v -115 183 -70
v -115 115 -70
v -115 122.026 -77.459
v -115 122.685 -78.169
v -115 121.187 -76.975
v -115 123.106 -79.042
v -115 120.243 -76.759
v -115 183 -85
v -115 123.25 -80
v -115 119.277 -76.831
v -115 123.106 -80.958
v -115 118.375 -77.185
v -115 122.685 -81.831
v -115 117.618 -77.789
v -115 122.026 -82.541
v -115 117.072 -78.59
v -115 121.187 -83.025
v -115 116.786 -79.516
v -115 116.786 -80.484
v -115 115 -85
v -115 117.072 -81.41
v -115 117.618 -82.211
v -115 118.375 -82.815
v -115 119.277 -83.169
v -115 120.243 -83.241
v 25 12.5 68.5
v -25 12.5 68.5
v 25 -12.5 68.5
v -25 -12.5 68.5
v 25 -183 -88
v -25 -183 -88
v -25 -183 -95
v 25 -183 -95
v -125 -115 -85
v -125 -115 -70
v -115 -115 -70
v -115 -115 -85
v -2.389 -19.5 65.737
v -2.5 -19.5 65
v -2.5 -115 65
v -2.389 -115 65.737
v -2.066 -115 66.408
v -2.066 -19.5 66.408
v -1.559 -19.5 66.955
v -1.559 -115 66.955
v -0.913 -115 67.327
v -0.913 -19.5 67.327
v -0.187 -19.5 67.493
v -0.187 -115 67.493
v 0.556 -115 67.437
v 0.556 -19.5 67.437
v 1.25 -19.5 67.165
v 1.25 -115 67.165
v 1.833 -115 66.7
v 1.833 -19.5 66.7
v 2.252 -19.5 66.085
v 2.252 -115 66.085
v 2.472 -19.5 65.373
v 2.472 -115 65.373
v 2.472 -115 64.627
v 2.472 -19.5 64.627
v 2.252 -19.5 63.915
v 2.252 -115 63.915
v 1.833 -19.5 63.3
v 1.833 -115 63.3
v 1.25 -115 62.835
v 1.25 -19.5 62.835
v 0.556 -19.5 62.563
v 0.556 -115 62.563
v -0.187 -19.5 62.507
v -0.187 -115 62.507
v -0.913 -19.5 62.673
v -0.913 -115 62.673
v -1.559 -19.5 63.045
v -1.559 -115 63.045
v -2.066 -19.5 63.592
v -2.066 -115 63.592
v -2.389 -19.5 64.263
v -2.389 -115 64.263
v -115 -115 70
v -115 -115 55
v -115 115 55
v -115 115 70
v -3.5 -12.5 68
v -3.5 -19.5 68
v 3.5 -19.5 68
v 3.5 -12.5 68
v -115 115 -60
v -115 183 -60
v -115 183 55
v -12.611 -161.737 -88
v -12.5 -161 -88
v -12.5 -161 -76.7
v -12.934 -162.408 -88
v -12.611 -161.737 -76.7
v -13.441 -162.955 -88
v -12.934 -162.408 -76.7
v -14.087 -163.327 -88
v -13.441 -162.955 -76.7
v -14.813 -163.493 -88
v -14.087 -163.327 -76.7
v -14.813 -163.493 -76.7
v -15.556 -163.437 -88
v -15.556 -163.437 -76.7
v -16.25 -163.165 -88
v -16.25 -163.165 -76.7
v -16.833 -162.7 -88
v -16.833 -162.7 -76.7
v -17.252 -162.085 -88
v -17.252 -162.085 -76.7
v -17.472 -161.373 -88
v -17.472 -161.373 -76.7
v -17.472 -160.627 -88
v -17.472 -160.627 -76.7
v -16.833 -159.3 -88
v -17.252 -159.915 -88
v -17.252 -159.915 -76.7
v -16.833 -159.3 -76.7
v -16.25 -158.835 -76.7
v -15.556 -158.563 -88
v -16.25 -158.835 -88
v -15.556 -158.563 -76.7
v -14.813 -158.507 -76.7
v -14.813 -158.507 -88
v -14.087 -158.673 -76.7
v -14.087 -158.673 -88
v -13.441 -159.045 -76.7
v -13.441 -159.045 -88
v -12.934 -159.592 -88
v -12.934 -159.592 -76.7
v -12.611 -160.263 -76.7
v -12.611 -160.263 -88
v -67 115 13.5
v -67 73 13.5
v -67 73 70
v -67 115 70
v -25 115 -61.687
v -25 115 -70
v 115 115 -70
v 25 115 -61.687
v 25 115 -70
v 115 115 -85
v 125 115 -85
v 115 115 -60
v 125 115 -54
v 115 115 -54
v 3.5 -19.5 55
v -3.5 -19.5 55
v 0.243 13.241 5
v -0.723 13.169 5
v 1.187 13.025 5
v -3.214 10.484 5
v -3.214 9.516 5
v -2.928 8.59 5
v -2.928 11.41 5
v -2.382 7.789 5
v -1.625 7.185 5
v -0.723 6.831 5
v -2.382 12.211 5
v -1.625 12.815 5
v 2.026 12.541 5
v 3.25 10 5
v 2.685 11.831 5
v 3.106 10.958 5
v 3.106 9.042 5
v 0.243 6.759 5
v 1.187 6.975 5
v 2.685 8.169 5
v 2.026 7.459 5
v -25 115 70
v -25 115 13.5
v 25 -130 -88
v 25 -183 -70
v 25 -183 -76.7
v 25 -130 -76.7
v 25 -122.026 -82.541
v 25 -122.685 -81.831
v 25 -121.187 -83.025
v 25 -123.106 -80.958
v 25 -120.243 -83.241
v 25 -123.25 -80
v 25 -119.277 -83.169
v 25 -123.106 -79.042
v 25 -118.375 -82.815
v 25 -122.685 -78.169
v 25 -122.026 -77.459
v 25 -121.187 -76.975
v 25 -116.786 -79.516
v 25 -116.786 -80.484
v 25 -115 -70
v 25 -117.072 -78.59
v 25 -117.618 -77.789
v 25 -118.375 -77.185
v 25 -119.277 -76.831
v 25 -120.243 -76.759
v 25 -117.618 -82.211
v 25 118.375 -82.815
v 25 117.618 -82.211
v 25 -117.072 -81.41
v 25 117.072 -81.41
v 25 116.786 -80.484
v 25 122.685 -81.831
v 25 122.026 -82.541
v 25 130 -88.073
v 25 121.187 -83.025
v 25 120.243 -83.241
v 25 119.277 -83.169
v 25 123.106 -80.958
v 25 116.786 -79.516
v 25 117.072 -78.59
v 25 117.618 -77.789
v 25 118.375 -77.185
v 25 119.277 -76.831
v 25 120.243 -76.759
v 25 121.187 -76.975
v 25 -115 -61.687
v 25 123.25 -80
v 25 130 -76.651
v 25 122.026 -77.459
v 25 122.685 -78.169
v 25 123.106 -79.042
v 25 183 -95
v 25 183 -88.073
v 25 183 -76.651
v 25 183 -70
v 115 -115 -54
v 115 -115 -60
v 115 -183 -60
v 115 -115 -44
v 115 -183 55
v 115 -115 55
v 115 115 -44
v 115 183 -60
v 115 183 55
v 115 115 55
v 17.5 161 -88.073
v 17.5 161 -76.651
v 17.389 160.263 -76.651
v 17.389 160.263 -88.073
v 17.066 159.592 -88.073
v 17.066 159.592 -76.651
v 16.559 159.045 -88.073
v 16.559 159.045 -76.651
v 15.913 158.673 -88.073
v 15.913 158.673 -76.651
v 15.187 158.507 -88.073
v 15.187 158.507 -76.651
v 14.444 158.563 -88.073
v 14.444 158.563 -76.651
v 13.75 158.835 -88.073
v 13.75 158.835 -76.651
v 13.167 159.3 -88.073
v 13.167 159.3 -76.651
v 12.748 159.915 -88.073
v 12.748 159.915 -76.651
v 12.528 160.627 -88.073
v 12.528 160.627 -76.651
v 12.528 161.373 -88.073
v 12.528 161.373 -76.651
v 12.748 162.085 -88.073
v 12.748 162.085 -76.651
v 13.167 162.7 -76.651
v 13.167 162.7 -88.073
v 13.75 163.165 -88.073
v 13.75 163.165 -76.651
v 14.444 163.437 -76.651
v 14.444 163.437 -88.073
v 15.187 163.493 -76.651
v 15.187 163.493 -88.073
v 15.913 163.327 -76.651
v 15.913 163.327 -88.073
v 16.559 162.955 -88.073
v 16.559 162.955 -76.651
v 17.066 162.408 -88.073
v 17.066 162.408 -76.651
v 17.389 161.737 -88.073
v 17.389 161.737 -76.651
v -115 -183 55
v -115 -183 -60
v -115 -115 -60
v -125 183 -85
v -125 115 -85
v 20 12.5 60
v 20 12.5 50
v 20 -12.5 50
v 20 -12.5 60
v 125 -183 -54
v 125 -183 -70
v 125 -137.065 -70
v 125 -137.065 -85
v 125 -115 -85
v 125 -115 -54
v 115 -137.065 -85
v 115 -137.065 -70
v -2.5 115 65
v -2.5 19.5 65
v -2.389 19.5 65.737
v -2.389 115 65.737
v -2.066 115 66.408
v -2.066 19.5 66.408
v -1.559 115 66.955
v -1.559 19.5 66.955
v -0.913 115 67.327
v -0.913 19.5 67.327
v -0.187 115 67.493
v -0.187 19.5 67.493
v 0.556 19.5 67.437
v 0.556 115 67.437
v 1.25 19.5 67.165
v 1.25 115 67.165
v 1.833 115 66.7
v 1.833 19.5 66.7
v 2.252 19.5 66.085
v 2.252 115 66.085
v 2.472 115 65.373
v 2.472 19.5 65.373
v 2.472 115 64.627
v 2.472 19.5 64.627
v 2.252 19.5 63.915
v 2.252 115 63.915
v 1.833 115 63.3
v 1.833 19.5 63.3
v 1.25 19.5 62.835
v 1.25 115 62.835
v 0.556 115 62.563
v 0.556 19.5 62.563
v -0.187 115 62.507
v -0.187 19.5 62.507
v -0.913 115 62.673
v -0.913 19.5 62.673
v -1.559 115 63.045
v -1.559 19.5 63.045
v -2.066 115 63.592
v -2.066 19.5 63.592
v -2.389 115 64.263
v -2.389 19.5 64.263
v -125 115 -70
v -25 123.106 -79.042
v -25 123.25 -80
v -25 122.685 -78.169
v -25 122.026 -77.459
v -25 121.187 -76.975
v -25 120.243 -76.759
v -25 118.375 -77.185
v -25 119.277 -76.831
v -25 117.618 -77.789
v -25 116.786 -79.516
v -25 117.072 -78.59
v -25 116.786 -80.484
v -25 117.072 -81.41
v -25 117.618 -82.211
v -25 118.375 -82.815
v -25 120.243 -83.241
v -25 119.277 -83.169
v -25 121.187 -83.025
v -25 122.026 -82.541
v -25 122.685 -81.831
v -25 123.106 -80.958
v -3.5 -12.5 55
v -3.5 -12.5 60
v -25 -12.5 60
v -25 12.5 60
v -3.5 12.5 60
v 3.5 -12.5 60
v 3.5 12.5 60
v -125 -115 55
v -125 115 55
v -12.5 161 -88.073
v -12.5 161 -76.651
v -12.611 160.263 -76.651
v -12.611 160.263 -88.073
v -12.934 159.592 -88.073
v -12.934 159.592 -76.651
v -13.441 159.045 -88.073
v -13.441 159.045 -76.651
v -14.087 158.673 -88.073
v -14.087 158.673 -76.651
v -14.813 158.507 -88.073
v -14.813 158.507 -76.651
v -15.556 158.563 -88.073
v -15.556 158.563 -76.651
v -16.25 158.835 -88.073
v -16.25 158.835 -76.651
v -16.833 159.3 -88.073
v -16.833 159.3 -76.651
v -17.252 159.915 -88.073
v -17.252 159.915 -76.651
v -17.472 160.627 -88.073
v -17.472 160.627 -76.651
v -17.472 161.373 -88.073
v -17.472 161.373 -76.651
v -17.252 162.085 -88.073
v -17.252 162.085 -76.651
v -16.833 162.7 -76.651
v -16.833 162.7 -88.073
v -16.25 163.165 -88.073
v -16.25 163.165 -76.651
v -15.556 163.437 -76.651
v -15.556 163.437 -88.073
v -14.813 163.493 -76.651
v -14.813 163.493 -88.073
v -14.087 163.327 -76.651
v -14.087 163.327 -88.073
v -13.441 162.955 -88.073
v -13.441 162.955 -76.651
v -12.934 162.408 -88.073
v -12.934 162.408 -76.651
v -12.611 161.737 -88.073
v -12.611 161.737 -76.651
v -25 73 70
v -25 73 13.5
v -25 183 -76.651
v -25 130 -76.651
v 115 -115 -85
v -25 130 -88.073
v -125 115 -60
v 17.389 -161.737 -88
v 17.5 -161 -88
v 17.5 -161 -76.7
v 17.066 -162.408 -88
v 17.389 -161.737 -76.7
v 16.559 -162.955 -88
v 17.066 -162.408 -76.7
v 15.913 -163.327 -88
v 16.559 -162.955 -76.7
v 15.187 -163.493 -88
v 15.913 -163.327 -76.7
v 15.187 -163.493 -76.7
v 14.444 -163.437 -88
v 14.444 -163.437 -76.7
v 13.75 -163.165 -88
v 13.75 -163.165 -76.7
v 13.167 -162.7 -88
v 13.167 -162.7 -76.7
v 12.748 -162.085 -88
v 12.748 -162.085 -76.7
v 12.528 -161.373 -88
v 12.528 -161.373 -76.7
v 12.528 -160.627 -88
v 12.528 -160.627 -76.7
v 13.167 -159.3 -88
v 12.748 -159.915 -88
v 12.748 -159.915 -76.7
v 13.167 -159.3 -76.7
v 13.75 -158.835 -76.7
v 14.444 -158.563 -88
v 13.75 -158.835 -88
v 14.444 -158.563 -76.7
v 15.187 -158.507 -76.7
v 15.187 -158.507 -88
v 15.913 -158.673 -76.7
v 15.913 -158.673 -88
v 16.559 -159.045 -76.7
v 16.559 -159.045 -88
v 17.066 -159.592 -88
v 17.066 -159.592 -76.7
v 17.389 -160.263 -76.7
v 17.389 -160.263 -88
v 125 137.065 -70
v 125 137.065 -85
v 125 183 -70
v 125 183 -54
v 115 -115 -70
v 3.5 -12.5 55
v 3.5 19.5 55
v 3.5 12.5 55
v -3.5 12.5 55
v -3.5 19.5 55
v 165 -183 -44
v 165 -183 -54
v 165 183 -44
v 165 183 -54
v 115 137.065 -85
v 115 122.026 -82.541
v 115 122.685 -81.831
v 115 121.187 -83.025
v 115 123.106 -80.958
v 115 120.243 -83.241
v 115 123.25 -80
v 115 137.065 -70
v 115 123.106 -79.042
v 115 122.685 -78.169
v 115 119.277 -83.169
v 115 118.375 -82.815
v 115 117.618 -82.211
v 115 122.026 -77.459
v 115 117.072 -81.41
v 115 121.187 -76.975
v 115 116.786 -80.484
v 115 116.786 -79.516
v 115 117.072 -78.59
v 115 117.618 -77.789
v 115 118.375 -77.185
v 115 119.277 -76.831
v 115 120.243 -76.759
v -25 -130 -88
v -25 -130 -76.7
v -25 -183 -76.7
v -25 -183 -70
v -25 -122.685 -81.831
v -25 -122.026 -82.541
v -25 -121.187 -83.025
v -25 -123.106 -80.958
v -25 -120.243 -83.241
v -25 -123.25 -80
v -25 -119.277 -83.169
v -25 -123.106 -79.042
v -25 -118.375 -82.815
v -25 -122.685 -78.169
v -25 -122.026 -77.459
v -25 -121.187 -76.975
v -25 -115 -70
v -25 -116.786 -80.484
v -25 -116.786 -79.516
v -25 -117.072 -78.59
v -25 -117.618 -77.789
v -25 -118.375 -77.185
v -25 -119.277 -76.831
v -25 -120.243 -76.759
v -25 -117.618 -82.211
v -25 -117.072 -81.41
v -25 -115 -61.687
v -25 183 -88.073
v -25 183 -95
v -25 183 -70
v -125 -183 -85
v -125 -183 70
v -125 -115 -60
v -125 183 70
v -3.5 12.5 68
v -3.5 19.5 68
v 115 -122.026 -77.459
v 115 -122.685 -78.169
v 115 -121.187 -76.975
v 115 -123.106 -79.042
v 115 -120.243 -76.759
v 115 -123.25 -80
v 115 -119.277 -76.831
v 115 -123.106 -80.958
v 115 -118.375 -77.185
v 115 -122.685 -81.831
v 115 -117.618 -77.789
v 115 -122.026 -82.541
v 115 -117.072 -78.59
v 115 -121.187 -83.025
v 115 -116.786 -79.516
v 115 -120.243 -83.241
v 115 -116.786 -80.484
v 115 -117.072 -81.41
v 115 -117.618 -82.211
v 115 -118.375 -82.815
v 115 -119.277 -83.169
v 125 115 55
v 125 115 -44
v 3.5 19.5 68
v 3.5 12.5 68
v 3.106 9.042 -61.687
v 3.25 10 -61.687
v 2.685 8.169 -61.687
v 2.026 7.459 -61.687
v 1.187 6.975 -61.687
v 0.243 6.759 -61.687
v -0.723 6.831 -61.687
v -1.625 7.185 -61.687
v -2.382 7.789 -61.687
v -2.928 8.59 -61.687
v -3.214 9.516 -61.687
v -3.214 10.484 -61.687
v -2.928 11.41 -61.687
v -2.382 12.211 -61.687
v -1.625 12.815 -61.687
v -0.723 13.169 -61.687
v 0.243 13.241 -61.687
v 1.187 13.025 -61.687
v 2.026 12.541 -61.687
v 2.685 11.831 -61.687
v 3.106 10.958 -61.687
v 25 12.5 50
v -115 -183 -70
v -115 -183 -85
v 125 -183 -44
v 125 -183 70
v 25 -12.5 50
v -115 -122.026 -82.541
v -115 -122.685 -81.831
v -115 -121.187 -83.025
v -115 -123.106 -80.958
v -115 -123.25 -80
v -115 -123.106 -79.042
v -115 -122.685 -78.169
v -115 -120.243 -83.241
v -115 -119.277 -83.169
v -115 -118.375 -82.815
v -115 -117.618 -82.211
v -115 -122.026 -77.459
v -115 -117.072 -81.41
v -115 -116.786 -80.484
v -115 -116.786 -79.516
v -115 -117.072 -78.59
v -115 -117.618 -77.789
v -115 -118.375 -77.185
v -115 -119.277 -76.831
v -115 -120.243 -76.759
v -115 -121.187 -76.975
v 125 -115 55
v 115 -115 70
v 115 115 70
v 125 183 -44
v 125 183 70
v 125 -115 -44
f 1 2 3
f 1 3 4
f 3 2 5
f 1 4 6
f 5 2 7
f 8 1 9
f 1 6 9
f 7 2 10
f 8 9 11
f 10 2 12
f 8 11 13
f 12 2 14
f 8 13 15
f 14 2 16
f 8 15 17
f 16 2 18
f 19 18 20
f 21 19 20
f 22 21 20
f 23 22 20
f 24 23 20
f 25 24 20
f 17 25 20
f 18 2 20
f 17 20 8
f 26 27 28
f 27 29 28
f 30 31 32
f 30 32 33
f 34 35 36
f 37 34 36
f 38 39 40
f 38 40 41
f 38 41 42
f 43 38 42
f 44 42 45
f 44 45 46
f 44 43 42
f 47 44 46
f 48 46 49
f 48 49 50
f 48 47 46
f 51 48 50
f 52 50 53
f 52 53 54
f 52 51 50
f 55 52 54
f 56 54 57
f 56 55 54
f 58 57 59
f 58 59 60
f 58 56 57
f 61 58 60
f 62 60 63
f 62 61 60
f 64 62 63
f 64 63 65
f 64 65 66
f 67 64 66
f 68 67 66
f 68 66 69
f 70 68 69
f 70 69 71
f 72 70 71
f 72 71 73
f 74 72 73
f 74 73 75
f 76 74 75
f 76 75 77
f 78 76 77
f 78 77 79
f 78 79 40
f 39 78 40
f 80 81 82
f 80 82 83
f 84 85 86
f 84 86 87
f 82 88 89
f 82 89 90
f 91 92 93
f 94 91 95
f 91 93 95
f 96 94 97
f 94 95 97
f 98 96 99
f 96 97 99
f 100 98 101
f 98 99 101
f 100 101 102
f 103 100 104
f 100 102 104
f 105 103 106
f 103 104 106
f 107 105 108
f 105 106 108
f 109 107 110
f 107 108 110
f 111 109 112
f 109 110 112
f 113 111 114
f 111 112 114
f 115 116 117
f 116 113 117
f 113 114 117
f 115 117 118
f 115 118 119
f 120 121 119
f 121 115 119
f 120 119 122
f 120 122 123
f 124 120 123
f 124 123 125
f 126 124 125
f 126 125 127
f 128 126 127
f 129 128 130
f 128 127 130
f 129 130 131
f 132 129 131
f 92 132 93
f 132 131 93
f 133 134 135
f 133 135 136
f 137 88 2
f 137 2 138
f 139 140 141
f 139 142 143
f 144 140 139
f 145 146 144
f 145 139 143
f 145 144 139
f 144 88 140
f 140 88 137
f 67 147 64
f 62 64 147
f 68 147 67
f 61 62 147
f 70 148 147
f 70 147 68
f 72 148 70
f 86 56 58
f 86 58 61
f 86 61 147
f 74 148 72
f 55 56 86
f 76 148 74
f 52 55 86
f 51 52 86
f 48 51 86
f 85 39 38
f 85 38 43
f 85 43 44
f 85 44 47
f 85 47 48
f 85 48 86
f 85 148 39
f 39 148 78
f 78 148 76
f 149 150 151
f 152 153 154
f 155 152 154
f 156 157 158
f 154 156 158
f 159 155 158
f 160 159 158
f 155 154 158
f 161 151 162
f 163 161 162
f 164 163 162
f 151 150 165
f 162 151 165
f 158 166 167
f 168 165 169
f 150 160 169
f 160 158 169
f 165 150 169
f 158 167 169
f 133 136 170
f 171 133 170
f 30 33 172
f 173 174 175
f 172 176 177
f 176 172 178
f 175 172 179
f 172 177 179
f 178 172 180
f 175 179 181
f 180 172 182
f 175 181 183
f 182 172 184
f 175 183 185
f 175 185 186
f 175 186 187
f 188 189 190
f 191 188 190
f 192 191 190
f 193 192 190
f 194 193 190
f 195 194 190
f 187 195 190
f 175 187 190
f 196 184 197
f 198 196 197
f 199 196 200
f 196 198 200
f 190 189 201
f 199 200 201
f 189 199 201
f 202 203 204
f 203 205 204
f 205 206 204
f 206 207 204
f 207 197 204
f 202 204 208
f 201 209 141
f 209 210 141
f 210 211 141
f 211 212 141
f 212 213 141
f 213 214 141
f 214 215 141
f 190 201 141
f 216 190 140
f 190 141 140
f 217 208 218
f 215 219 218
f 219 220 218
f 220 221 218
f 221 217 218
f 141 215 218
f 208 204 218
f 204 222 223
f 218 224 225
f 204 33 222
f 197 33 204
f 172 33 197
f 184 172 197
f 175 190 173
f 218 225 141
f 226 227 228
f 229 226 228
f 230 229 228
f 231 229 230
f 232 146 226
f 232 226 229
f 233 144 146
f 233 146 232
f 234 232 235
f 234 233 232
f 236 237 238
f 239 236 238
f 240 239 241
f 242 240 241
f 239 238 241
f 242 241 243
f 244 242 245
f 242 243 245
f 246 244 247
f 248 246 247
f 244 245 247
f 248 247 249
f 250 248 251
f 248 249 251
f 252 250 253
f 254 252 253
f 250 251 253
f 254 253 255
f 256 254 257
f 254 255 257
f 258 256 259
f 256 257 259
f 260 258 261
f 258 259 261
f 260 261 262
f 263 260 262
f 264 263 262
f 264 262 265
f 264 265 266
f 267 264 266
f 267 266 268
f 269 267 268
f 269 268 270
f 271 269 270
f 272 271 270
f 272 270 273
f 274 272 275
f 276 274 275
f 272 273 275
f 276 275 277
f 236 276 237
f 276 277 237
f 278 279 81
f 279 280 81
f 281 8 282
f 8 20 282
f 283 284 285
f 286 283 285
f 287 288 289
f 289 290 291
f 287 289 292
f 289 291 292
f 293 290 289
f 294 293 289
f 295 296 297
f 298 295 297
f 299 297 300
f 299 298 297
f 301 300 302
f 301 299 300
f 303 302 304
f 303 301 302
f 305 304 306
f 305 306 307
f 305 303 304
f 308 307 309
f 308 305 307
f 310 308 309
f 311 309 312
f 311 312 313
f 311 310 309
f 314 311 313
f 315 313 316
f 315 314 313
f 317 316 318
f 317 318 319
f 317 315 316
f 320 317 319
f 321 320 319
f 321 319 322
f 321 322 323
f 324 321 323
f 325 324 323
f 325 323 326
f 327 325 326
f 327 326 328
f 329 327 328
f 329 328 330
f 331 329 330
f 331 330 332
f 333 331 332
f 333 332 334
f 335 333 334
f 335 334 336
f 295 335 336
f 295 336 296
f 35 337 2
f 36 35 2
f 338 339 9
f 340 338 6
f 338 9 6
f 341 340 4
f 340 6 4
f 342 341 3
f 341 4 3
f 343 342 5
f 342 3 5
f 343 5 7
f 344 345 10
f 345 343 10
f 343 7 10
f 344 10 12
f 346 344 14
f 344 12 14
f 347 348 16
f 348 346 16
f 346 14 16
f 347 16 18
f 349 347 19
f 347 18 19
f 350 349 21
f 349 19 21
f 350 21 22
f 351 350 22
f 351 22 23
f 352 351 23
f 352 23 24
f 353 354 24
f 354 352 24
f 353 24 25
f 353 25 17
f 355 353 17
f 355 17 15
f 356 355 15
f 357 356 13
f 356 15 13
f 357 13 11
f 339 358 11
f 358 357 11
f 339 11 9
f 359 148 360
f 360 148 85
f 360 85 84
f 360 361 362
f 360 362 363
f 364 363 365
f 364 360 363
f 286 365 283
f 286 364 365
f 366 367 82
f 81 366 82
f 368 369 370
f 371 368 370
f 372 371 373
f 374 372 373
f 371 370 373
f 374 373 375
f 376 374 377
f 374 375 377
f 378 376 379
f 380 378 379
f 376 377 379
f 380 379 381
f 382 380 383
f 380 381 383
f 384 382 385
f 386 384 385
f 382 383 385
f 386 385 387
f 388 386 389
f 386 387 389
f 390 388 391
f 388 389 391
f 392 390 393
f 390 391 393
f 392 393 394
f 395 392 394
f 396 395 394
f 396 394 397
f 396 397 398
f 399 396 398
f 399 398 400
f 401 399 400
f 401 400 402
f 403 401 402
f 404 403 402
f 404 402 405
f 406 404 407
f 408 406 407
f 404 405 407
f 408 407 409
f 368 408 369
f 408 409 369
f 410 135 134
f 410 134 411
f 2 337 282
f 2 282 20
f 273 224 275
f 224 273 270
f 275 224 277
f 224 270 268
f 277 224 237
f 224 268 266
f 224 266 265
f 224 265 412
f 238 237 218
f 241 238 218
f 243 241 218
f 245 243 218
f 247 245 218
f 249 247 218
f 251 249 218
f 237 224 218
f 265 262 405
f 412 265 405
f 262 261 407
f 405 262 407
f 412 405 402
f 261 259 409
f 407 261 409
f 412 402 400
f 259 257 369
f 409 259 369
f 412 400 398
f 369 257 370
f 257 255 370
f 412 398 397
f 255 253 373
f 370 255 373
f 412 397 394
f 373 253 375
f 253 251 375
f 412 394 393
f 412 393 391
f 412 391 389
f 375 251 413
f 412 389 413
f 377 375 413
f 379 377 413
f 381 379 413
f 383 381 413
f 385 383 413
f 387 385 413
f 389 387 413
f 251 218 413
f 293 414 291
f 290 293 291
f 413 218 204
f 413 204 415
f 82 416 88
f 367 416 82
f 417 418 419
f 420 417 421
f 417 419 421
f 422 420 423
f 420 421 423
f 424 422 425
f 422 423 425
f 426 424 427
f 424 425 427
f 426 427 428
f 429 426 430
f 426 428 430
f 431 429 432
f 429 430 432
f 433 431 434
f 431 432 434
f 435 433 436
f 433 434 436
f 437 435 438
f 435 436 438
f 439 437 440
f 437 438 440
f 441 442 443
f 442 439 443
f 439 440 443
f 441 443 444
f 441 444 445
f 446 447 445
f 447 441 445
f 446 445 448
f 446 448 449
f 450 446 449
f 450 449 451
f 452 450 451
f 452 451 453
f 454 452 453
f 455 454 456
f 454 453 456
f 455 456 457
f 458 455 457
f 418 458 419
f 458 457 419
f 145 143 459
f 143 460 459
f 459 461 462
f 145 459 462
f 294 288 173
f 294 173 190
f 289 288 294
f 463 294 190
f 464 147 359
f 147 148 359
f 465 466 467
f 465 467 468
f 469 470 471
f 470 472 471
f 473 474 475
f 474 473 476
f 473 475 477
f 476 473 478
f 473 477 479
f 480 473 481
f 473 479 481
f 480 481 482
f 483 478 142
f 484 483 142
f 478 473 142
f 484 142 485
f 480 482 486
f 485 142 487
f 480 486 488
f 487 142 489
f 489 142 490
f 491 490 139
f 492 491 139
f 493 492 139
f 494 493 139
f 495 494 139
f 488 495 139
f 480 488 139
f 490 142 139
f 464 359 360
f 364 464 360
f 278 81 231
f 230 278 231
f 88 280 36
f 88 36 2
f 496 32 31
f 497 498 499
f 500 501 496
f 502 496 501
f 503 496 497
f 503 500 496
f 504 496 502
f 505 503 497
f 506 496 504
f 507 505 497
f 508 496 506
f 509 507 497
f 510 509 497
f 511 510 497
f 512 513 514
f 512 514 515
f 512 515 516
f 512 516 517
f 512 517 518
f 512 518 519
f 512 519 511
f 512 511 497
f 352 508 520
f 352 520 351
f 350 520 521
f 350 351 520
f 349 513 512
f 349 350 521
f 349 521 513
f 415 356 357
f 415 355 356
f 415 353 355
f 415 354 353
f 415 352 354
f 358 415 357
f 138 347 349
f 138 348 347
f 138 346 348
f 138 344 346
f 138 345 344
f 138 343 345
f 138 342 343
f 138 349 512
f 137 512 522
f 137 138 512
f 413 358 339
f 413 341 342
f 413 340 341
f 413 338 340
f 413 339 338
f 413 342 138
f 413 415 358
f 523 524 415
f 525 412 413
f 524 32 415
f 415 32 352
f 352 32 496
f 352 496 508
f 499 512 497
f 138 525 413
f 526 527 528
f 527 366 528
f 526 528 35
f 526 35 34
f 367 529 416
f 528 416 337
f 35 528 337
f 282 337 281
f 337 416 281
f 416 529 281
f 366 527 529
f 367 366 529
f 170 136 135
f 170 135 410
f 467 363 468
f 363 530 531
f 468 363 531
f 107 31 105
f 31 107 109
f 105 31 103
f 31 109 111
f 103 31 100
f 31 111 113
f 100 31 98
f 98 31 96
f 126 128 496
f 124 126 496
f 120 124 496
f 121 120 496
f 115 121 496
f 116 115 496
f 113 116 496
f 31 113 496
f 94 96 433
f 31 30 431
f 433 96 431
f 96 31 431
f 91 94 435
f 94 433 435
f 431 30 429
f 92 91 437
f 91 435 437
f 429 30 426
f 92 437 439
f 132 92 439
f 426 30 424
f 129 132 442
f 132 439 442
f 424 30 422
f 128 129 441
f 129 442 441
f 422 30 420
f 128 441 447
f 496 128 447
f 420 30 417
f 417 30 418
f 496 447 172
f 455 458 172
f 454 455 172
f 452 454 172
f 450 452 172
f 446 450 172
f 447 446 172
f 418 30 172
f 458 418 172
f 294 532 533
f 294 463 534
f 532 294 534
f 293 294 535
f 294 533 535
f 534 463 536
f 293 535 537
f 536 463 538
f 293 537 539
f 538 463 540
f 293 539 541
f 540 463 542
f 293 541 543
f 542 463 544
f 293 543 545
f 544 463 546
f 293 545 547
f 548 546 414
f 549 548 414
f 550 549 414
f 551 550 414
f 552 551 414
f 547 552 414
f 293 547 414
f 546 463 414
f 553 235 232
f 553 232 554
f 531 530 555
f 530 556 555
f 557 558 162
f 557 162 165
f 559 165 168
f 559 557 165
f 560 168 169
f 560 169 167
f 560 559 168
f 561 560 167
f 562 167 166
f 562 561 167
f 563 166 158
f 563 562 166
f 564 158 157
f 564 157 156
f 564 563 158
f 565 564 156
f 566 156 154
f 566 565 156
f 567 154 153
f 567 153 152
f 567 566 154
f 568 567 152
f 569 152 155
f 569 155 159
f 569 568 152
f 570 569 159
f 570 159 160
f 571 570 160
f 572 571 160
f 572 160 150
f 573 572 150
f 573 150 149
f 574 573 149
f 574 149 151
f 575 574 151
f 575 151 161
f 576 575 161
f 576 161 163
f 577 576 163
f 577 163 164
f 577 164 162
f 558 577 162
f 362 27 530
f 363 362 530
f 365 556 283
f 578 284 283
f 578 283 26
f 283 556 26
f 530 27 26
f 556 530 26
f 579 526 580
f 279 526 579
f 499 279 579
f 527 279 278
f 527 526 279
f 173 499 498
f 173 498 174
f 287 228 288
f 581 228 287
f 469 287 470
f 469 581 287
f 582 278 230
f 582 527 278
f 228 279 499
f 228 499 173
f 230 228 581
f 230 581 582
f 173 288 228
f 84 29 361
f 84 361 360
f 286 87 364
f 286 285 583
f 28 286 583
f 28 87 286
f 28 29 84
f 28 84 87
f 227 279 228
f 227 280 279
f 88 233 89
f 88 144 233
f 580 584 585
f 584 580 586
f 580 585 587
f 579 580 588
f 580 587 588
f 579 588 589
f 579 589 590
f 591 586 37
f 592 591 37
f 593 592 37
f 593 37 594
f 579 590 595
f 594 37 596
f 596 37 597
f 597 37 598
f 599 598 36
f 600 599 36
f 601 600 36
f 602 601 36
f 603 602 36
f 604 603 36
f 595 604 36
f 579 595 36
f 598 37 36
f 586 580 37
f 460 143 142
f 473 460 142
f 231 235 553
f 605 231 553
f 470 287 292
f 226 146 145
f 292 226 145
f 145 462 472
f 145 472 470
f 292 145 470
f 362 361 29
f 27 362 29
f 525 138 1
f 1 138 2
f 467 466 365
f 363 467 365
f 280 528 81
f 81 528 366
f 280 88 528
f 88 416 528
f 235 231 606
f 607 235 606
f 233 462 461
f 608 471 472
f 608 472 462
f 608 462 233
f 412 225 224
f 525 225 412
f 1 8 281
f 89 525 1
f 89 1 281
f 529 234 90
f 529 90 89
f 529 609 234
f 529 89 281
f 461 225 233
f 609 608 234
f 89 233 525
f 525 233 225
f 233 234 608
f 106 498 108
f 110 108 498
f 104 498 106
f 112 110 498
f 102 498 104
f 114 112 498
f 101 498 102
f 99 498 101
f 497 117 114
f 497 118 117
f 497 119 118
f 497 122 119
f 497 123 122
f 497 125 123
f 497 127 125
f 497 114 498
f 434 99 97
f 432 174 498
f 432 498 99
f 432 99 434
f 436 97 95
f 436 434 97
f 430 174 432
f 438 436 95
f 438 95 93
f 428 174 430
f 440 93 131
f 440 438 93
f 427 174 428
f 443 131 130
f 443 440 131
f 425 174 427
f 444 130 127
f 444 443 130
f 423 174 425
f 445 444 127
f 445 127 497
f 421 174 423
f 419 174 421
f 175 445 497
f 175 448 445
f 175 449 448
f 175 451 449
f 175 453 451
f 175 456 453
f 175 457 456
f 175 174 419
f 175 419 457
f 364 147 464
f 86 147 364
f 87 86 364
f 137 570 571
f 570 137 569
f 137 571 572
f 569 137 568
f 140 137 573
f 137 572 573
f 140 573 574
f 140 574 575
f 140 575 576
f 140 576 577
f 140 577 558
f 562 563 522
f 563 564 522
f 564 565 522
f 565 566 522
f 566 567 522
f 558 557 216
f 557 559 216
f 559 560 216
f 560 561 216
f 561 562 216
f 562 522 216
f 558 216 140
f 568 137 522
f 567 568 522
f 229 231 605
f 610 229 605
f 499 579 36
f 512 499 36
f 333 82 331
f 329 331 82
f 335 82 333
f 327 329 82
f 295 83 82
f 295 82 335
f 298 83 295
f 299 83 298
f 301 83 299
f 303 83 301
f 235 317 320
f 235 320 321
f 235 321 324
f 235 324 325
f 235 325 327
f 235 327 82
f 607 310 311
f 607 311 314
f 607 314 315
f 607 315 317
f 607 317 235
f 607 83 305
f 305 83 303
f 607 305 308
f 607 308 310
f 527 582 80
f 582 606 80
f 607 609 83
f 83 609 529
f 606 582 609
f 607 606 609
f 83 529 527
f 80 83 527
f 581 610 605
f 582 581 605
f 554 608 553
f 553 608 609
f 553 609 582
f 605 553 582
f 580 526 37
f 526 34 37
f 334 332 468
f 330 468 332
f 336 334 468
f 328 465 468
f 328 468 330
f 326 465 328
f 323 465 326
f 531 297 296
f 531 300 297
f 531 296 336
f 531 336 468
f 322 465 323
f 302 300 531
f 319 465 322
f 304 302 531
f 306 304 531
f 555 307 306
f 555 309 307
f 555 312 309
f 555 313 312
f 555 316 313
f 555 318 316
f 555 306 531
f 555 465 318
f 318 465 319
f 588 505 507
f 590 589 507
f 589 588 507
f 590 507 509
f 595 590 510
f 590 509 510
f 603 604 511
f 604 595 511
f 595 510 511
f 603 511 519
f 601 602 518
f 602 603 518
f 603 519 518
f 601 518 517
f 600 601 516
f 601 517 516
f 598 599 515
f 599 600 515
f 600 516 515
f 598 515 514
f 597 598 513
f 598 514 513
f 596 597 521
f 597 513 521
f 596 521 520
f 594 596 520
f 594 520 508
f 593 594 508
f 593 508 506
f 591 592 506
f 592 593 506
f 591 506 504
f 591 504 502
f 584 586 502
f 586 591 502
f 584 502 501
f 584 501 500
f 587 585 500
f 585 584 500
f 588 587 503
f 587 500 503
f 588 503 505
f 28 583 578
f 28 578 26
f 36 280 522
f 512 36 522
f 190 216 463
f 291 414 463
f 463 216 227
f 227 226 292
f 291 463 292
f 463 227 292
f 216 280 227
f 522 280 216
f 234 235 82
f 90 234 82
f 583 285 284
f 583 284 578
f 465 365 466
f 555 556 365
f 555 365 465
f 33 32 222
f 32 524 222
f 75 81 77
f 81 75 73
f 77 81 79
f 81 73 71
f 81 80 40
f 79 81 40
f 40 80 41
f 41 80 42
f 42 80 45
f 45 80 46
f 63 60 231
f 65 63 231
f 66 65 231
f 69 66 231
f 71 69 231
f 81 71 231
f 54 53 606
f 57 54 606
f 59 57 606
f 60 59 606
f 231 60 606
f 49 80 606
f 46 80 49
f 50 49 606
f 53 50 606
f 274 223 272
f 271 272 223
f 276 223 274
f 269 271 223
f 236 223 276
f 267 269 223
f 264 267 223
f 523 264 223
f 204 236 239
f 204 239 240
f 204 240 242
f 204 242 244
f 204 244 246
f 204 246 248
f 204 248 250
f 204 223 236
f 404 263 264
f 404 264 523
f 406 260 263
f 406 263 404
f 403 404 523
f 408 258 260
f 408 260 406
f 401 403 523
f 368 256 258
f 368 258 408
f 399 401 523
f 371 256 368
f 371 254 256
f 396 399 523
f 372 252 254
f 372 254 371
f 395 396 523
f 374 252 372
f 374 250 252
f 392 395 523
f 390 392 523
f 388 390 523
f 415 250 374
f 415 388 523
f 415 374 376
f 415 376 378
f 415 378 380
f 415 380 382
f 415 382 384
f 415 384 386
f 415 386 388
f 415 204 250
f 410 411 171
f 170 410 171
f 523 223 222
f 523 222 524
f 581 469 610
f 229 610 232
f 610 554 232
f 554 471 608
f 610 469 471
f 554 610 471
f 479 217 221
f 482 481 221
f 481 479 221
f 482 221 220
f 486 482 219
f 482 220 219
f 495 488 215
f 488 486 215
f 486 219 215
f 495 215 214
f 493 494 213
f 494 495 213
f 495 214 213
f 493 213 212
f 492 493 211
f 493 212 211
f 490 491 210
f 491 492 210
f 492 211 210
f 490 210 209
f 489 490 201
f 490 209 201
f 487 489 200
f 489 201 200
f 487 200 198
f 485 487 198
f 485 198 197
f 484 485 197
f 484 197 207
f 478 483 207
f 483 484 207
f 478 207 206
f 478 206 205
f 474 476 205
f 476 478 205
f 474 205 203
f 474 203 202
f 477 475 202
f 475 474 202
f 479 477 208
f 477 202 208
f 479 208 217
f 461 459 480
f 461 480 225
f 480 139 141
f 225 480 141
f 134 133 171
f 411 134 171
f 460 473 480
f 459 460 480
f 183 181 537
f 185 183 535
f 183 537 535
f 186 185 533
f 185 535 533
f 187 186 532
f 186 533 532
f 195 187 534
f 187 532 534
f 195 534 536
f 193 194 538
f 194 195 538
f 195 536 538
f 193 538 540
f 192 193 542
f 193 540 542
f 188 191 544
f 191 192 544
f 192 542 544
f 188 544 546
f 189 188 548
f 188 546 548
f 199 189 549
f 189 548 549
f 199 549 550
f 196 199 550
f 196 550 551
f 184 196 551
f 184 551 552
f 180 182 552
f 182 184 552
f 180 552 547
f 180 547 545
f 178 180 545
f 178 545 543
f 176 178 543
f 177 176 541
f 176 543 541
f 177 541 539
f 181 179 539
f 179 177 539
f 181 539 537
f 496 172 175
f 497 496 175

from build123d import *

# Parameters (mm, degrees)
F0_W         = 250
F0_H         = 250
F1_DEPTH     = 70
F2_T         = -10
F3_W         = 230
F3_H         = 120
F4_DEPTH     = 300
F5_W         = 230
F5_H         = 120
F6_DEPTH     = 300
F7_W         = 230
F7_H         = 230
F8_DEPTH     = 500
F9_W         = 10
F9_H         = 10
F1_FACE3_W   = 250
F1_FACE3_H   = 250
F1_FACE3_W_2 = 230
F1_FACE3_H_2 = 230
F10_DEPTH    = 15
F11_R        = 2.5
F12_DEPTH    = 250
F13_W        = 50
F13_H        = 18.5
F14_DEPTH    = 12.5
F16_DEPTH    = 10
F17_W        = 7
F17_H        = 13
F18_DEPTH    = 3.5
F19_R        = 3.25
F20_DEPTH    = 240
F21_W        = 50
F21_H        = 33.3125502616
F22_DEPTH    = 115
F23_R        = 3.25
F24_DEPTH    = 240
F25_R        = 3.25
F26_DEPTH    = 100
F27_W        = 42
F27_H        = 42
F28_DEPTH    = 56.5
F29_W        = 230
F29_H        = 115
F30_DEPTH    = 58
F31_W        = 230
F31_H        = 115
F32_DEPTH    = 58
F33_W        = 50
F33_H        = 25
F34_DEPTH    = 15
F35_W        = 50
F35_H        = 6.9269549847
F35_H_2      = 6.6508132219
F36_DEPTH    = 53
F37_R        = 2.5
F38_DEPTH    = 11.4222317934
F39_W        = 10
F39_H        = 230
F40_DEPTH    = 25
F41_W        = 40
F41_H        = 10
F41_W_2      = 10
F42_DEPTH    = 230
F43_W        = 40
F43_H        = 10
F44_DEPTH    = 68
F45_W        = 45.9353046417
F45_H        = 15
F46_DEPTH    = 25
F47_DEPTH    = 68
F48_W        = 45.9353
F48_H        = 15
F49_DEPTH    = 25
F50_DEPTH    = 68
F51_W        = 53
F51_H        = 11.3
F52_DEPTH    = 50
F53_R        = 2.5
F54_DEPTH    = 18.3


with BuildPart() as f1:
    # F0 (on Top) → F1 (new body, symmetric)
    with BuildSketch(Plane.XY):
        Rectangle(F0_W, F0_H)
    extrude(amount=F1_DEPTH, both=True)

    # F2
    f2_openings = [f1.faces().sort_by_distance(p)[0] for p in [
        (0, 0, 70),
    ]]
    offset(amount=F2_T, openings=f2_openings)

    # F3 (on face) → F4 (cut)
    with BuildSketch(Plane.XZ.offset(125)):
        Rectangle(F3_W, F3_H)
    extrude(amount=-F4_DEPTH, mode=Mode.SUBTRACT)

    # F5 (on face) → F6 (cut)
    with BuildSketch(Plane(origin=(-125, 0, 0), x_dir=(0, -1, 0), z_dir=(-1, 0, 0))):
        Rectangle(F5_W, F5_H)
    extrude(amount=-F6_DEPTH, mode=Mode.SUBTRACT)

    # F7 (on face) → F8 (cut)
    with BuildSketch(Plane.XY.offset(-60)):
        Rectangle(F7_W, F7_H)
    extrude(amount=-F8_DEPTH, mode=Mode.SUBTRACT)

    # F9 (on face) + F1_face3 (on face) → F10 (join)
    with BuildSketch(Plane(origin=(0, 0, -70), x_dir=(1, 0, 0), z_dir=(0, 0, -1))):
        with Locations((-120, -120)):
            Rectangle(F9_W, F9_H)
        with Locations((-120, 120)):
            Rectangle(F9_W, F9_H)
        with Locations((120, -120)):
            Rectangle(F9_W, F9_H)
        with Locations((120, 120)):
            Rectangle(F9_W, F9_H)
    with BuildSketch(Plane.XY.offset(70)):
        Rectangle(F1_FACE3_W, F1_FACE3_H)
        Rectangle(F1_FACE3_W_2, F1_FACE3_H_2, mode=Mode.SUBTRACT)
    extrude(amount=F10_DEPTH, dir=(0, 0, -1))

    # F11 (on face) → F12 (join)
    with BuildSketch(Plane(origin=(0, 125, 0), x_dir=(-1, 0, 0), z_dir=(0, 1, 0))):
        with Locations((0, 65)):
            Circle(F11_R)
    extrude(amount=-F12_DEPTH)

    # F13 (on Front) → F14 (join, symmetric)
    with BuildSketch(Plane.XZ):
        with Locations((0, 59.25)):
            Rectangle(F13_W, F13_H)
    extrude(amount=F14_DEPTH, both=True)

    # F15 (on face) → F16 (cut)
    with BuildSketch(Plane(origin=(0, 0, 50), x_dir=(1, 0, 0), z_dir=(0, 0, -1))):
        Polygon((20, -12.5), (20, 7.5), (20, 12.5), (-25, 12.5), (-25, -12.5), align=None)
    extrude(amount=-F16_DEPTH, mode=Mode.SUBTRACT)

    # F17 (on Right) → F18 (join, symmetric)
    with BuildSketch(Plane.YZ):
        with Locations((-16, 61.5)):
            Rectangle(F17_W, F17_H)
        with Locations((16, 61.5)):
            Rectangle(F17_W, F17_H)
    extrude(amount=F18_DEPTH, both=True)

    # F19 (on face) → F20 (join)
    with BuildSketch(Plane.YZ.offset(-115)):
        with Locations((120, -80)):
            Circle(F19_R)
    extrude(amount=F20_DEPTH)

    # F21 (on Front) → F22 (join, symmetric)
    with BuildSketch(Plane.XZ):
        with Locations((0, -78.3437248692)):
            Rectangle(F21_W, F21_H)
    extrude(amount=F22_DEPTH, both=True)

    # F23 (on face) → F24 (join)
    with BuildSketch(Plane(origin=(115, 0, 0), x_dir=(0, -1, 0), z_dir=(-1, 0, 0))):
        with Locations((120, -80)):
            Circle(F23_R)
    extrude(amount=F24_DEPTH)

    # F25 (on face) → F26 (join)
    with BuildSketch(Plane(origin=(0, 0, -95), x_dir=(1, 0, 0), z_dir=(0, 0, -1))):
        with Locations((0, -10)):
            Circle(F25_R)
    extrude(amount=-F26_DEPTH)

    # F29 (on face) → F30 (join)
    with BuildSketch(Plane(origin=(0, 125, 0), x_dir=(-1, 0, 0), z_dir=(0, 1, 0))):
        Polygon((-115, -85), (-115, -70), (115, -70), (115, -85), (125, -85), (125, 70), (-125, 70), (-125, -85), align=None)
        with Locations((0, -2.5)):
            Rectangle(F29_W, F29_H, mode=Mode.SUBTRACT)
    extrude(amount=F30_DEPTH)

    # F31 (on face) → F32 (join)
    with BuildSketch(Plane.XZ.offset(125)):
        Polygon((125, 70), (-125, 70), (-125, -85), (-115, -85), (-115, -70), (115, -70), (115, -85), (125, -85), align=None)
        with Locations((0, -2.5)):
            Rectangle(F31_W, F31_H, mode=Mode.SUBTRACT)
    extrude(amount=F32_DEPTH)

    # F33 (on face) → F34 (join)
    with BuildSketch(Plane(origin=(0, 115, 0), x_dir=(-1, 0, 0), z_dir=(0, 1, 0))):
        with Locations((0, -82.5)):
            Rectangle(F33_W, F33_H)
    extrude(amount=F34_DEPTH)

    # F35 (on face) → F36 (join, through all)
    with BuildSketch(Plane(origin=(0, 130, 0), x_dir=(-1, 0, 0), z_dir=(0, 1, 0))):
        with Locations((0, -91.5365225077)):
            Rectangle(F35_W, F35_H)
        with Locations((0, -73.325406611)):
            Rectangle(F35_W, F35_H_2)
    extrude(amount=F36_DEPTH)

    # F37 (on face) → F38 (join, through all)
    with BuildSketch(Plane(origin=(0, 0, -76.6508132219), x_dir=(1, 0, 0), z_dir=(0, 0, -1))):
        with Locations((-15, -161)):
            Circle(F37_R)
        with Locations((15, -161)):
            Circle(F37_R)
    extrude(amount=F38_DEPTH)

    # F39 (on face) → F40 (cut)
    with BuildSketch(Plane(origin=(0, 0, -70), x_dir=(1, 0, 0), z_dir=(0, 0, -1))):
        with Locations((120, 0)):
            Rectangle(F39_W, F39_H)
    extrude(amount=-F40_DEPTH, mode=Mode.SUBTRACT)

    # F41 (on face) → F42 (join, through all)
    with BuildSketch(Plane.XZ.offset(-115)):
        with Locations((145, -49)):
            Rectangle(F41_W, F41_H)
        with Locations((120, -49)):
            Rectangle(F41_W_2, F41_H)
    extrude(amount=F42_DEPTH)

    # F43 (on face) → F44 (join, through all)
    with BuildSketch(Plane(origin=(0, 115, 0), x_dir=(-1, 0, 0), z_dir=(0, 1, 0))):
        with Locations((-145, -49)):
            Rectangle(F43_W, F43_H)
    extrude(amount=F44_DEPTH)

    # F45 (on face) → F46 (cut)
    with BuildSketch(Plane(origin=(115, 0, 0), x_dir=(0, -1, 0), z_dir=(-1, 0, 0))):
        with Locations((-160.0323476791, -77.5)):
            Rectangle(F45_W, F45_H)
    extrude(amount=-F46_DEPTH, mode=Mode.SUBTRACT)

    # F47 (add, through all): a face of the model
    f47_faces = [f1.faces().sort_by_distance(p)[0] for p in [
        (145, -115, -49),
    ]]
    extrude(f47_faces, amount=F47_DEPTH)

    # F48 (on face) → F49 (cut)
    with BuildSketch(Plane.YZ.offset(125)):
        with Locations((-160.03235, -77.5)):
            Rectangle(F48_W, F48_H)
    extrude(amount=-F49_DEPTH, mode=Mode.SUBTRACT)

    # F50 (add, through all): a face of the model
    f50_faces = [f1.faces().sort_by_distance(p)[0] for p in [
        (0, -115, -82.5),
    ]]
    extrude(f50_faces, amount=F50_DEPTH)

    # F51 (on face) → F52 (cut)
    with BuildSketch(Plane.YZ.offset(25)):
        with Locations((-156.5, -82.35)):
            Rectangle(F51_W, F51_H)
    extrude(amount=-F52_DEPTH, mode=Mode.SUBTRACT)

    # F53 (on face) → F54 (join, through all)
    with BuildSketch(Plane(origin=(0, 0, -76.7), x_dir=(1, 0, 0), z_dir=(0, 0, -1))):
        with Locations((15, 161)):
            Circle(F53_R)
        with Locations((-15, 161)):
            Circle(F53_R)
    extrude(amount=F54_DEPTH)


with BuildPart() as f28:
    # F27 (on face) → F28 (new body)
    with BuildSketch(Plane.XY.offset(70)):
        with Locations((-46, 94)):
            Rectangle(F27_W, F27_H)
    extrude(amount=-F28_DEPTH)


solid = Compound([f1.part, f28.part])
